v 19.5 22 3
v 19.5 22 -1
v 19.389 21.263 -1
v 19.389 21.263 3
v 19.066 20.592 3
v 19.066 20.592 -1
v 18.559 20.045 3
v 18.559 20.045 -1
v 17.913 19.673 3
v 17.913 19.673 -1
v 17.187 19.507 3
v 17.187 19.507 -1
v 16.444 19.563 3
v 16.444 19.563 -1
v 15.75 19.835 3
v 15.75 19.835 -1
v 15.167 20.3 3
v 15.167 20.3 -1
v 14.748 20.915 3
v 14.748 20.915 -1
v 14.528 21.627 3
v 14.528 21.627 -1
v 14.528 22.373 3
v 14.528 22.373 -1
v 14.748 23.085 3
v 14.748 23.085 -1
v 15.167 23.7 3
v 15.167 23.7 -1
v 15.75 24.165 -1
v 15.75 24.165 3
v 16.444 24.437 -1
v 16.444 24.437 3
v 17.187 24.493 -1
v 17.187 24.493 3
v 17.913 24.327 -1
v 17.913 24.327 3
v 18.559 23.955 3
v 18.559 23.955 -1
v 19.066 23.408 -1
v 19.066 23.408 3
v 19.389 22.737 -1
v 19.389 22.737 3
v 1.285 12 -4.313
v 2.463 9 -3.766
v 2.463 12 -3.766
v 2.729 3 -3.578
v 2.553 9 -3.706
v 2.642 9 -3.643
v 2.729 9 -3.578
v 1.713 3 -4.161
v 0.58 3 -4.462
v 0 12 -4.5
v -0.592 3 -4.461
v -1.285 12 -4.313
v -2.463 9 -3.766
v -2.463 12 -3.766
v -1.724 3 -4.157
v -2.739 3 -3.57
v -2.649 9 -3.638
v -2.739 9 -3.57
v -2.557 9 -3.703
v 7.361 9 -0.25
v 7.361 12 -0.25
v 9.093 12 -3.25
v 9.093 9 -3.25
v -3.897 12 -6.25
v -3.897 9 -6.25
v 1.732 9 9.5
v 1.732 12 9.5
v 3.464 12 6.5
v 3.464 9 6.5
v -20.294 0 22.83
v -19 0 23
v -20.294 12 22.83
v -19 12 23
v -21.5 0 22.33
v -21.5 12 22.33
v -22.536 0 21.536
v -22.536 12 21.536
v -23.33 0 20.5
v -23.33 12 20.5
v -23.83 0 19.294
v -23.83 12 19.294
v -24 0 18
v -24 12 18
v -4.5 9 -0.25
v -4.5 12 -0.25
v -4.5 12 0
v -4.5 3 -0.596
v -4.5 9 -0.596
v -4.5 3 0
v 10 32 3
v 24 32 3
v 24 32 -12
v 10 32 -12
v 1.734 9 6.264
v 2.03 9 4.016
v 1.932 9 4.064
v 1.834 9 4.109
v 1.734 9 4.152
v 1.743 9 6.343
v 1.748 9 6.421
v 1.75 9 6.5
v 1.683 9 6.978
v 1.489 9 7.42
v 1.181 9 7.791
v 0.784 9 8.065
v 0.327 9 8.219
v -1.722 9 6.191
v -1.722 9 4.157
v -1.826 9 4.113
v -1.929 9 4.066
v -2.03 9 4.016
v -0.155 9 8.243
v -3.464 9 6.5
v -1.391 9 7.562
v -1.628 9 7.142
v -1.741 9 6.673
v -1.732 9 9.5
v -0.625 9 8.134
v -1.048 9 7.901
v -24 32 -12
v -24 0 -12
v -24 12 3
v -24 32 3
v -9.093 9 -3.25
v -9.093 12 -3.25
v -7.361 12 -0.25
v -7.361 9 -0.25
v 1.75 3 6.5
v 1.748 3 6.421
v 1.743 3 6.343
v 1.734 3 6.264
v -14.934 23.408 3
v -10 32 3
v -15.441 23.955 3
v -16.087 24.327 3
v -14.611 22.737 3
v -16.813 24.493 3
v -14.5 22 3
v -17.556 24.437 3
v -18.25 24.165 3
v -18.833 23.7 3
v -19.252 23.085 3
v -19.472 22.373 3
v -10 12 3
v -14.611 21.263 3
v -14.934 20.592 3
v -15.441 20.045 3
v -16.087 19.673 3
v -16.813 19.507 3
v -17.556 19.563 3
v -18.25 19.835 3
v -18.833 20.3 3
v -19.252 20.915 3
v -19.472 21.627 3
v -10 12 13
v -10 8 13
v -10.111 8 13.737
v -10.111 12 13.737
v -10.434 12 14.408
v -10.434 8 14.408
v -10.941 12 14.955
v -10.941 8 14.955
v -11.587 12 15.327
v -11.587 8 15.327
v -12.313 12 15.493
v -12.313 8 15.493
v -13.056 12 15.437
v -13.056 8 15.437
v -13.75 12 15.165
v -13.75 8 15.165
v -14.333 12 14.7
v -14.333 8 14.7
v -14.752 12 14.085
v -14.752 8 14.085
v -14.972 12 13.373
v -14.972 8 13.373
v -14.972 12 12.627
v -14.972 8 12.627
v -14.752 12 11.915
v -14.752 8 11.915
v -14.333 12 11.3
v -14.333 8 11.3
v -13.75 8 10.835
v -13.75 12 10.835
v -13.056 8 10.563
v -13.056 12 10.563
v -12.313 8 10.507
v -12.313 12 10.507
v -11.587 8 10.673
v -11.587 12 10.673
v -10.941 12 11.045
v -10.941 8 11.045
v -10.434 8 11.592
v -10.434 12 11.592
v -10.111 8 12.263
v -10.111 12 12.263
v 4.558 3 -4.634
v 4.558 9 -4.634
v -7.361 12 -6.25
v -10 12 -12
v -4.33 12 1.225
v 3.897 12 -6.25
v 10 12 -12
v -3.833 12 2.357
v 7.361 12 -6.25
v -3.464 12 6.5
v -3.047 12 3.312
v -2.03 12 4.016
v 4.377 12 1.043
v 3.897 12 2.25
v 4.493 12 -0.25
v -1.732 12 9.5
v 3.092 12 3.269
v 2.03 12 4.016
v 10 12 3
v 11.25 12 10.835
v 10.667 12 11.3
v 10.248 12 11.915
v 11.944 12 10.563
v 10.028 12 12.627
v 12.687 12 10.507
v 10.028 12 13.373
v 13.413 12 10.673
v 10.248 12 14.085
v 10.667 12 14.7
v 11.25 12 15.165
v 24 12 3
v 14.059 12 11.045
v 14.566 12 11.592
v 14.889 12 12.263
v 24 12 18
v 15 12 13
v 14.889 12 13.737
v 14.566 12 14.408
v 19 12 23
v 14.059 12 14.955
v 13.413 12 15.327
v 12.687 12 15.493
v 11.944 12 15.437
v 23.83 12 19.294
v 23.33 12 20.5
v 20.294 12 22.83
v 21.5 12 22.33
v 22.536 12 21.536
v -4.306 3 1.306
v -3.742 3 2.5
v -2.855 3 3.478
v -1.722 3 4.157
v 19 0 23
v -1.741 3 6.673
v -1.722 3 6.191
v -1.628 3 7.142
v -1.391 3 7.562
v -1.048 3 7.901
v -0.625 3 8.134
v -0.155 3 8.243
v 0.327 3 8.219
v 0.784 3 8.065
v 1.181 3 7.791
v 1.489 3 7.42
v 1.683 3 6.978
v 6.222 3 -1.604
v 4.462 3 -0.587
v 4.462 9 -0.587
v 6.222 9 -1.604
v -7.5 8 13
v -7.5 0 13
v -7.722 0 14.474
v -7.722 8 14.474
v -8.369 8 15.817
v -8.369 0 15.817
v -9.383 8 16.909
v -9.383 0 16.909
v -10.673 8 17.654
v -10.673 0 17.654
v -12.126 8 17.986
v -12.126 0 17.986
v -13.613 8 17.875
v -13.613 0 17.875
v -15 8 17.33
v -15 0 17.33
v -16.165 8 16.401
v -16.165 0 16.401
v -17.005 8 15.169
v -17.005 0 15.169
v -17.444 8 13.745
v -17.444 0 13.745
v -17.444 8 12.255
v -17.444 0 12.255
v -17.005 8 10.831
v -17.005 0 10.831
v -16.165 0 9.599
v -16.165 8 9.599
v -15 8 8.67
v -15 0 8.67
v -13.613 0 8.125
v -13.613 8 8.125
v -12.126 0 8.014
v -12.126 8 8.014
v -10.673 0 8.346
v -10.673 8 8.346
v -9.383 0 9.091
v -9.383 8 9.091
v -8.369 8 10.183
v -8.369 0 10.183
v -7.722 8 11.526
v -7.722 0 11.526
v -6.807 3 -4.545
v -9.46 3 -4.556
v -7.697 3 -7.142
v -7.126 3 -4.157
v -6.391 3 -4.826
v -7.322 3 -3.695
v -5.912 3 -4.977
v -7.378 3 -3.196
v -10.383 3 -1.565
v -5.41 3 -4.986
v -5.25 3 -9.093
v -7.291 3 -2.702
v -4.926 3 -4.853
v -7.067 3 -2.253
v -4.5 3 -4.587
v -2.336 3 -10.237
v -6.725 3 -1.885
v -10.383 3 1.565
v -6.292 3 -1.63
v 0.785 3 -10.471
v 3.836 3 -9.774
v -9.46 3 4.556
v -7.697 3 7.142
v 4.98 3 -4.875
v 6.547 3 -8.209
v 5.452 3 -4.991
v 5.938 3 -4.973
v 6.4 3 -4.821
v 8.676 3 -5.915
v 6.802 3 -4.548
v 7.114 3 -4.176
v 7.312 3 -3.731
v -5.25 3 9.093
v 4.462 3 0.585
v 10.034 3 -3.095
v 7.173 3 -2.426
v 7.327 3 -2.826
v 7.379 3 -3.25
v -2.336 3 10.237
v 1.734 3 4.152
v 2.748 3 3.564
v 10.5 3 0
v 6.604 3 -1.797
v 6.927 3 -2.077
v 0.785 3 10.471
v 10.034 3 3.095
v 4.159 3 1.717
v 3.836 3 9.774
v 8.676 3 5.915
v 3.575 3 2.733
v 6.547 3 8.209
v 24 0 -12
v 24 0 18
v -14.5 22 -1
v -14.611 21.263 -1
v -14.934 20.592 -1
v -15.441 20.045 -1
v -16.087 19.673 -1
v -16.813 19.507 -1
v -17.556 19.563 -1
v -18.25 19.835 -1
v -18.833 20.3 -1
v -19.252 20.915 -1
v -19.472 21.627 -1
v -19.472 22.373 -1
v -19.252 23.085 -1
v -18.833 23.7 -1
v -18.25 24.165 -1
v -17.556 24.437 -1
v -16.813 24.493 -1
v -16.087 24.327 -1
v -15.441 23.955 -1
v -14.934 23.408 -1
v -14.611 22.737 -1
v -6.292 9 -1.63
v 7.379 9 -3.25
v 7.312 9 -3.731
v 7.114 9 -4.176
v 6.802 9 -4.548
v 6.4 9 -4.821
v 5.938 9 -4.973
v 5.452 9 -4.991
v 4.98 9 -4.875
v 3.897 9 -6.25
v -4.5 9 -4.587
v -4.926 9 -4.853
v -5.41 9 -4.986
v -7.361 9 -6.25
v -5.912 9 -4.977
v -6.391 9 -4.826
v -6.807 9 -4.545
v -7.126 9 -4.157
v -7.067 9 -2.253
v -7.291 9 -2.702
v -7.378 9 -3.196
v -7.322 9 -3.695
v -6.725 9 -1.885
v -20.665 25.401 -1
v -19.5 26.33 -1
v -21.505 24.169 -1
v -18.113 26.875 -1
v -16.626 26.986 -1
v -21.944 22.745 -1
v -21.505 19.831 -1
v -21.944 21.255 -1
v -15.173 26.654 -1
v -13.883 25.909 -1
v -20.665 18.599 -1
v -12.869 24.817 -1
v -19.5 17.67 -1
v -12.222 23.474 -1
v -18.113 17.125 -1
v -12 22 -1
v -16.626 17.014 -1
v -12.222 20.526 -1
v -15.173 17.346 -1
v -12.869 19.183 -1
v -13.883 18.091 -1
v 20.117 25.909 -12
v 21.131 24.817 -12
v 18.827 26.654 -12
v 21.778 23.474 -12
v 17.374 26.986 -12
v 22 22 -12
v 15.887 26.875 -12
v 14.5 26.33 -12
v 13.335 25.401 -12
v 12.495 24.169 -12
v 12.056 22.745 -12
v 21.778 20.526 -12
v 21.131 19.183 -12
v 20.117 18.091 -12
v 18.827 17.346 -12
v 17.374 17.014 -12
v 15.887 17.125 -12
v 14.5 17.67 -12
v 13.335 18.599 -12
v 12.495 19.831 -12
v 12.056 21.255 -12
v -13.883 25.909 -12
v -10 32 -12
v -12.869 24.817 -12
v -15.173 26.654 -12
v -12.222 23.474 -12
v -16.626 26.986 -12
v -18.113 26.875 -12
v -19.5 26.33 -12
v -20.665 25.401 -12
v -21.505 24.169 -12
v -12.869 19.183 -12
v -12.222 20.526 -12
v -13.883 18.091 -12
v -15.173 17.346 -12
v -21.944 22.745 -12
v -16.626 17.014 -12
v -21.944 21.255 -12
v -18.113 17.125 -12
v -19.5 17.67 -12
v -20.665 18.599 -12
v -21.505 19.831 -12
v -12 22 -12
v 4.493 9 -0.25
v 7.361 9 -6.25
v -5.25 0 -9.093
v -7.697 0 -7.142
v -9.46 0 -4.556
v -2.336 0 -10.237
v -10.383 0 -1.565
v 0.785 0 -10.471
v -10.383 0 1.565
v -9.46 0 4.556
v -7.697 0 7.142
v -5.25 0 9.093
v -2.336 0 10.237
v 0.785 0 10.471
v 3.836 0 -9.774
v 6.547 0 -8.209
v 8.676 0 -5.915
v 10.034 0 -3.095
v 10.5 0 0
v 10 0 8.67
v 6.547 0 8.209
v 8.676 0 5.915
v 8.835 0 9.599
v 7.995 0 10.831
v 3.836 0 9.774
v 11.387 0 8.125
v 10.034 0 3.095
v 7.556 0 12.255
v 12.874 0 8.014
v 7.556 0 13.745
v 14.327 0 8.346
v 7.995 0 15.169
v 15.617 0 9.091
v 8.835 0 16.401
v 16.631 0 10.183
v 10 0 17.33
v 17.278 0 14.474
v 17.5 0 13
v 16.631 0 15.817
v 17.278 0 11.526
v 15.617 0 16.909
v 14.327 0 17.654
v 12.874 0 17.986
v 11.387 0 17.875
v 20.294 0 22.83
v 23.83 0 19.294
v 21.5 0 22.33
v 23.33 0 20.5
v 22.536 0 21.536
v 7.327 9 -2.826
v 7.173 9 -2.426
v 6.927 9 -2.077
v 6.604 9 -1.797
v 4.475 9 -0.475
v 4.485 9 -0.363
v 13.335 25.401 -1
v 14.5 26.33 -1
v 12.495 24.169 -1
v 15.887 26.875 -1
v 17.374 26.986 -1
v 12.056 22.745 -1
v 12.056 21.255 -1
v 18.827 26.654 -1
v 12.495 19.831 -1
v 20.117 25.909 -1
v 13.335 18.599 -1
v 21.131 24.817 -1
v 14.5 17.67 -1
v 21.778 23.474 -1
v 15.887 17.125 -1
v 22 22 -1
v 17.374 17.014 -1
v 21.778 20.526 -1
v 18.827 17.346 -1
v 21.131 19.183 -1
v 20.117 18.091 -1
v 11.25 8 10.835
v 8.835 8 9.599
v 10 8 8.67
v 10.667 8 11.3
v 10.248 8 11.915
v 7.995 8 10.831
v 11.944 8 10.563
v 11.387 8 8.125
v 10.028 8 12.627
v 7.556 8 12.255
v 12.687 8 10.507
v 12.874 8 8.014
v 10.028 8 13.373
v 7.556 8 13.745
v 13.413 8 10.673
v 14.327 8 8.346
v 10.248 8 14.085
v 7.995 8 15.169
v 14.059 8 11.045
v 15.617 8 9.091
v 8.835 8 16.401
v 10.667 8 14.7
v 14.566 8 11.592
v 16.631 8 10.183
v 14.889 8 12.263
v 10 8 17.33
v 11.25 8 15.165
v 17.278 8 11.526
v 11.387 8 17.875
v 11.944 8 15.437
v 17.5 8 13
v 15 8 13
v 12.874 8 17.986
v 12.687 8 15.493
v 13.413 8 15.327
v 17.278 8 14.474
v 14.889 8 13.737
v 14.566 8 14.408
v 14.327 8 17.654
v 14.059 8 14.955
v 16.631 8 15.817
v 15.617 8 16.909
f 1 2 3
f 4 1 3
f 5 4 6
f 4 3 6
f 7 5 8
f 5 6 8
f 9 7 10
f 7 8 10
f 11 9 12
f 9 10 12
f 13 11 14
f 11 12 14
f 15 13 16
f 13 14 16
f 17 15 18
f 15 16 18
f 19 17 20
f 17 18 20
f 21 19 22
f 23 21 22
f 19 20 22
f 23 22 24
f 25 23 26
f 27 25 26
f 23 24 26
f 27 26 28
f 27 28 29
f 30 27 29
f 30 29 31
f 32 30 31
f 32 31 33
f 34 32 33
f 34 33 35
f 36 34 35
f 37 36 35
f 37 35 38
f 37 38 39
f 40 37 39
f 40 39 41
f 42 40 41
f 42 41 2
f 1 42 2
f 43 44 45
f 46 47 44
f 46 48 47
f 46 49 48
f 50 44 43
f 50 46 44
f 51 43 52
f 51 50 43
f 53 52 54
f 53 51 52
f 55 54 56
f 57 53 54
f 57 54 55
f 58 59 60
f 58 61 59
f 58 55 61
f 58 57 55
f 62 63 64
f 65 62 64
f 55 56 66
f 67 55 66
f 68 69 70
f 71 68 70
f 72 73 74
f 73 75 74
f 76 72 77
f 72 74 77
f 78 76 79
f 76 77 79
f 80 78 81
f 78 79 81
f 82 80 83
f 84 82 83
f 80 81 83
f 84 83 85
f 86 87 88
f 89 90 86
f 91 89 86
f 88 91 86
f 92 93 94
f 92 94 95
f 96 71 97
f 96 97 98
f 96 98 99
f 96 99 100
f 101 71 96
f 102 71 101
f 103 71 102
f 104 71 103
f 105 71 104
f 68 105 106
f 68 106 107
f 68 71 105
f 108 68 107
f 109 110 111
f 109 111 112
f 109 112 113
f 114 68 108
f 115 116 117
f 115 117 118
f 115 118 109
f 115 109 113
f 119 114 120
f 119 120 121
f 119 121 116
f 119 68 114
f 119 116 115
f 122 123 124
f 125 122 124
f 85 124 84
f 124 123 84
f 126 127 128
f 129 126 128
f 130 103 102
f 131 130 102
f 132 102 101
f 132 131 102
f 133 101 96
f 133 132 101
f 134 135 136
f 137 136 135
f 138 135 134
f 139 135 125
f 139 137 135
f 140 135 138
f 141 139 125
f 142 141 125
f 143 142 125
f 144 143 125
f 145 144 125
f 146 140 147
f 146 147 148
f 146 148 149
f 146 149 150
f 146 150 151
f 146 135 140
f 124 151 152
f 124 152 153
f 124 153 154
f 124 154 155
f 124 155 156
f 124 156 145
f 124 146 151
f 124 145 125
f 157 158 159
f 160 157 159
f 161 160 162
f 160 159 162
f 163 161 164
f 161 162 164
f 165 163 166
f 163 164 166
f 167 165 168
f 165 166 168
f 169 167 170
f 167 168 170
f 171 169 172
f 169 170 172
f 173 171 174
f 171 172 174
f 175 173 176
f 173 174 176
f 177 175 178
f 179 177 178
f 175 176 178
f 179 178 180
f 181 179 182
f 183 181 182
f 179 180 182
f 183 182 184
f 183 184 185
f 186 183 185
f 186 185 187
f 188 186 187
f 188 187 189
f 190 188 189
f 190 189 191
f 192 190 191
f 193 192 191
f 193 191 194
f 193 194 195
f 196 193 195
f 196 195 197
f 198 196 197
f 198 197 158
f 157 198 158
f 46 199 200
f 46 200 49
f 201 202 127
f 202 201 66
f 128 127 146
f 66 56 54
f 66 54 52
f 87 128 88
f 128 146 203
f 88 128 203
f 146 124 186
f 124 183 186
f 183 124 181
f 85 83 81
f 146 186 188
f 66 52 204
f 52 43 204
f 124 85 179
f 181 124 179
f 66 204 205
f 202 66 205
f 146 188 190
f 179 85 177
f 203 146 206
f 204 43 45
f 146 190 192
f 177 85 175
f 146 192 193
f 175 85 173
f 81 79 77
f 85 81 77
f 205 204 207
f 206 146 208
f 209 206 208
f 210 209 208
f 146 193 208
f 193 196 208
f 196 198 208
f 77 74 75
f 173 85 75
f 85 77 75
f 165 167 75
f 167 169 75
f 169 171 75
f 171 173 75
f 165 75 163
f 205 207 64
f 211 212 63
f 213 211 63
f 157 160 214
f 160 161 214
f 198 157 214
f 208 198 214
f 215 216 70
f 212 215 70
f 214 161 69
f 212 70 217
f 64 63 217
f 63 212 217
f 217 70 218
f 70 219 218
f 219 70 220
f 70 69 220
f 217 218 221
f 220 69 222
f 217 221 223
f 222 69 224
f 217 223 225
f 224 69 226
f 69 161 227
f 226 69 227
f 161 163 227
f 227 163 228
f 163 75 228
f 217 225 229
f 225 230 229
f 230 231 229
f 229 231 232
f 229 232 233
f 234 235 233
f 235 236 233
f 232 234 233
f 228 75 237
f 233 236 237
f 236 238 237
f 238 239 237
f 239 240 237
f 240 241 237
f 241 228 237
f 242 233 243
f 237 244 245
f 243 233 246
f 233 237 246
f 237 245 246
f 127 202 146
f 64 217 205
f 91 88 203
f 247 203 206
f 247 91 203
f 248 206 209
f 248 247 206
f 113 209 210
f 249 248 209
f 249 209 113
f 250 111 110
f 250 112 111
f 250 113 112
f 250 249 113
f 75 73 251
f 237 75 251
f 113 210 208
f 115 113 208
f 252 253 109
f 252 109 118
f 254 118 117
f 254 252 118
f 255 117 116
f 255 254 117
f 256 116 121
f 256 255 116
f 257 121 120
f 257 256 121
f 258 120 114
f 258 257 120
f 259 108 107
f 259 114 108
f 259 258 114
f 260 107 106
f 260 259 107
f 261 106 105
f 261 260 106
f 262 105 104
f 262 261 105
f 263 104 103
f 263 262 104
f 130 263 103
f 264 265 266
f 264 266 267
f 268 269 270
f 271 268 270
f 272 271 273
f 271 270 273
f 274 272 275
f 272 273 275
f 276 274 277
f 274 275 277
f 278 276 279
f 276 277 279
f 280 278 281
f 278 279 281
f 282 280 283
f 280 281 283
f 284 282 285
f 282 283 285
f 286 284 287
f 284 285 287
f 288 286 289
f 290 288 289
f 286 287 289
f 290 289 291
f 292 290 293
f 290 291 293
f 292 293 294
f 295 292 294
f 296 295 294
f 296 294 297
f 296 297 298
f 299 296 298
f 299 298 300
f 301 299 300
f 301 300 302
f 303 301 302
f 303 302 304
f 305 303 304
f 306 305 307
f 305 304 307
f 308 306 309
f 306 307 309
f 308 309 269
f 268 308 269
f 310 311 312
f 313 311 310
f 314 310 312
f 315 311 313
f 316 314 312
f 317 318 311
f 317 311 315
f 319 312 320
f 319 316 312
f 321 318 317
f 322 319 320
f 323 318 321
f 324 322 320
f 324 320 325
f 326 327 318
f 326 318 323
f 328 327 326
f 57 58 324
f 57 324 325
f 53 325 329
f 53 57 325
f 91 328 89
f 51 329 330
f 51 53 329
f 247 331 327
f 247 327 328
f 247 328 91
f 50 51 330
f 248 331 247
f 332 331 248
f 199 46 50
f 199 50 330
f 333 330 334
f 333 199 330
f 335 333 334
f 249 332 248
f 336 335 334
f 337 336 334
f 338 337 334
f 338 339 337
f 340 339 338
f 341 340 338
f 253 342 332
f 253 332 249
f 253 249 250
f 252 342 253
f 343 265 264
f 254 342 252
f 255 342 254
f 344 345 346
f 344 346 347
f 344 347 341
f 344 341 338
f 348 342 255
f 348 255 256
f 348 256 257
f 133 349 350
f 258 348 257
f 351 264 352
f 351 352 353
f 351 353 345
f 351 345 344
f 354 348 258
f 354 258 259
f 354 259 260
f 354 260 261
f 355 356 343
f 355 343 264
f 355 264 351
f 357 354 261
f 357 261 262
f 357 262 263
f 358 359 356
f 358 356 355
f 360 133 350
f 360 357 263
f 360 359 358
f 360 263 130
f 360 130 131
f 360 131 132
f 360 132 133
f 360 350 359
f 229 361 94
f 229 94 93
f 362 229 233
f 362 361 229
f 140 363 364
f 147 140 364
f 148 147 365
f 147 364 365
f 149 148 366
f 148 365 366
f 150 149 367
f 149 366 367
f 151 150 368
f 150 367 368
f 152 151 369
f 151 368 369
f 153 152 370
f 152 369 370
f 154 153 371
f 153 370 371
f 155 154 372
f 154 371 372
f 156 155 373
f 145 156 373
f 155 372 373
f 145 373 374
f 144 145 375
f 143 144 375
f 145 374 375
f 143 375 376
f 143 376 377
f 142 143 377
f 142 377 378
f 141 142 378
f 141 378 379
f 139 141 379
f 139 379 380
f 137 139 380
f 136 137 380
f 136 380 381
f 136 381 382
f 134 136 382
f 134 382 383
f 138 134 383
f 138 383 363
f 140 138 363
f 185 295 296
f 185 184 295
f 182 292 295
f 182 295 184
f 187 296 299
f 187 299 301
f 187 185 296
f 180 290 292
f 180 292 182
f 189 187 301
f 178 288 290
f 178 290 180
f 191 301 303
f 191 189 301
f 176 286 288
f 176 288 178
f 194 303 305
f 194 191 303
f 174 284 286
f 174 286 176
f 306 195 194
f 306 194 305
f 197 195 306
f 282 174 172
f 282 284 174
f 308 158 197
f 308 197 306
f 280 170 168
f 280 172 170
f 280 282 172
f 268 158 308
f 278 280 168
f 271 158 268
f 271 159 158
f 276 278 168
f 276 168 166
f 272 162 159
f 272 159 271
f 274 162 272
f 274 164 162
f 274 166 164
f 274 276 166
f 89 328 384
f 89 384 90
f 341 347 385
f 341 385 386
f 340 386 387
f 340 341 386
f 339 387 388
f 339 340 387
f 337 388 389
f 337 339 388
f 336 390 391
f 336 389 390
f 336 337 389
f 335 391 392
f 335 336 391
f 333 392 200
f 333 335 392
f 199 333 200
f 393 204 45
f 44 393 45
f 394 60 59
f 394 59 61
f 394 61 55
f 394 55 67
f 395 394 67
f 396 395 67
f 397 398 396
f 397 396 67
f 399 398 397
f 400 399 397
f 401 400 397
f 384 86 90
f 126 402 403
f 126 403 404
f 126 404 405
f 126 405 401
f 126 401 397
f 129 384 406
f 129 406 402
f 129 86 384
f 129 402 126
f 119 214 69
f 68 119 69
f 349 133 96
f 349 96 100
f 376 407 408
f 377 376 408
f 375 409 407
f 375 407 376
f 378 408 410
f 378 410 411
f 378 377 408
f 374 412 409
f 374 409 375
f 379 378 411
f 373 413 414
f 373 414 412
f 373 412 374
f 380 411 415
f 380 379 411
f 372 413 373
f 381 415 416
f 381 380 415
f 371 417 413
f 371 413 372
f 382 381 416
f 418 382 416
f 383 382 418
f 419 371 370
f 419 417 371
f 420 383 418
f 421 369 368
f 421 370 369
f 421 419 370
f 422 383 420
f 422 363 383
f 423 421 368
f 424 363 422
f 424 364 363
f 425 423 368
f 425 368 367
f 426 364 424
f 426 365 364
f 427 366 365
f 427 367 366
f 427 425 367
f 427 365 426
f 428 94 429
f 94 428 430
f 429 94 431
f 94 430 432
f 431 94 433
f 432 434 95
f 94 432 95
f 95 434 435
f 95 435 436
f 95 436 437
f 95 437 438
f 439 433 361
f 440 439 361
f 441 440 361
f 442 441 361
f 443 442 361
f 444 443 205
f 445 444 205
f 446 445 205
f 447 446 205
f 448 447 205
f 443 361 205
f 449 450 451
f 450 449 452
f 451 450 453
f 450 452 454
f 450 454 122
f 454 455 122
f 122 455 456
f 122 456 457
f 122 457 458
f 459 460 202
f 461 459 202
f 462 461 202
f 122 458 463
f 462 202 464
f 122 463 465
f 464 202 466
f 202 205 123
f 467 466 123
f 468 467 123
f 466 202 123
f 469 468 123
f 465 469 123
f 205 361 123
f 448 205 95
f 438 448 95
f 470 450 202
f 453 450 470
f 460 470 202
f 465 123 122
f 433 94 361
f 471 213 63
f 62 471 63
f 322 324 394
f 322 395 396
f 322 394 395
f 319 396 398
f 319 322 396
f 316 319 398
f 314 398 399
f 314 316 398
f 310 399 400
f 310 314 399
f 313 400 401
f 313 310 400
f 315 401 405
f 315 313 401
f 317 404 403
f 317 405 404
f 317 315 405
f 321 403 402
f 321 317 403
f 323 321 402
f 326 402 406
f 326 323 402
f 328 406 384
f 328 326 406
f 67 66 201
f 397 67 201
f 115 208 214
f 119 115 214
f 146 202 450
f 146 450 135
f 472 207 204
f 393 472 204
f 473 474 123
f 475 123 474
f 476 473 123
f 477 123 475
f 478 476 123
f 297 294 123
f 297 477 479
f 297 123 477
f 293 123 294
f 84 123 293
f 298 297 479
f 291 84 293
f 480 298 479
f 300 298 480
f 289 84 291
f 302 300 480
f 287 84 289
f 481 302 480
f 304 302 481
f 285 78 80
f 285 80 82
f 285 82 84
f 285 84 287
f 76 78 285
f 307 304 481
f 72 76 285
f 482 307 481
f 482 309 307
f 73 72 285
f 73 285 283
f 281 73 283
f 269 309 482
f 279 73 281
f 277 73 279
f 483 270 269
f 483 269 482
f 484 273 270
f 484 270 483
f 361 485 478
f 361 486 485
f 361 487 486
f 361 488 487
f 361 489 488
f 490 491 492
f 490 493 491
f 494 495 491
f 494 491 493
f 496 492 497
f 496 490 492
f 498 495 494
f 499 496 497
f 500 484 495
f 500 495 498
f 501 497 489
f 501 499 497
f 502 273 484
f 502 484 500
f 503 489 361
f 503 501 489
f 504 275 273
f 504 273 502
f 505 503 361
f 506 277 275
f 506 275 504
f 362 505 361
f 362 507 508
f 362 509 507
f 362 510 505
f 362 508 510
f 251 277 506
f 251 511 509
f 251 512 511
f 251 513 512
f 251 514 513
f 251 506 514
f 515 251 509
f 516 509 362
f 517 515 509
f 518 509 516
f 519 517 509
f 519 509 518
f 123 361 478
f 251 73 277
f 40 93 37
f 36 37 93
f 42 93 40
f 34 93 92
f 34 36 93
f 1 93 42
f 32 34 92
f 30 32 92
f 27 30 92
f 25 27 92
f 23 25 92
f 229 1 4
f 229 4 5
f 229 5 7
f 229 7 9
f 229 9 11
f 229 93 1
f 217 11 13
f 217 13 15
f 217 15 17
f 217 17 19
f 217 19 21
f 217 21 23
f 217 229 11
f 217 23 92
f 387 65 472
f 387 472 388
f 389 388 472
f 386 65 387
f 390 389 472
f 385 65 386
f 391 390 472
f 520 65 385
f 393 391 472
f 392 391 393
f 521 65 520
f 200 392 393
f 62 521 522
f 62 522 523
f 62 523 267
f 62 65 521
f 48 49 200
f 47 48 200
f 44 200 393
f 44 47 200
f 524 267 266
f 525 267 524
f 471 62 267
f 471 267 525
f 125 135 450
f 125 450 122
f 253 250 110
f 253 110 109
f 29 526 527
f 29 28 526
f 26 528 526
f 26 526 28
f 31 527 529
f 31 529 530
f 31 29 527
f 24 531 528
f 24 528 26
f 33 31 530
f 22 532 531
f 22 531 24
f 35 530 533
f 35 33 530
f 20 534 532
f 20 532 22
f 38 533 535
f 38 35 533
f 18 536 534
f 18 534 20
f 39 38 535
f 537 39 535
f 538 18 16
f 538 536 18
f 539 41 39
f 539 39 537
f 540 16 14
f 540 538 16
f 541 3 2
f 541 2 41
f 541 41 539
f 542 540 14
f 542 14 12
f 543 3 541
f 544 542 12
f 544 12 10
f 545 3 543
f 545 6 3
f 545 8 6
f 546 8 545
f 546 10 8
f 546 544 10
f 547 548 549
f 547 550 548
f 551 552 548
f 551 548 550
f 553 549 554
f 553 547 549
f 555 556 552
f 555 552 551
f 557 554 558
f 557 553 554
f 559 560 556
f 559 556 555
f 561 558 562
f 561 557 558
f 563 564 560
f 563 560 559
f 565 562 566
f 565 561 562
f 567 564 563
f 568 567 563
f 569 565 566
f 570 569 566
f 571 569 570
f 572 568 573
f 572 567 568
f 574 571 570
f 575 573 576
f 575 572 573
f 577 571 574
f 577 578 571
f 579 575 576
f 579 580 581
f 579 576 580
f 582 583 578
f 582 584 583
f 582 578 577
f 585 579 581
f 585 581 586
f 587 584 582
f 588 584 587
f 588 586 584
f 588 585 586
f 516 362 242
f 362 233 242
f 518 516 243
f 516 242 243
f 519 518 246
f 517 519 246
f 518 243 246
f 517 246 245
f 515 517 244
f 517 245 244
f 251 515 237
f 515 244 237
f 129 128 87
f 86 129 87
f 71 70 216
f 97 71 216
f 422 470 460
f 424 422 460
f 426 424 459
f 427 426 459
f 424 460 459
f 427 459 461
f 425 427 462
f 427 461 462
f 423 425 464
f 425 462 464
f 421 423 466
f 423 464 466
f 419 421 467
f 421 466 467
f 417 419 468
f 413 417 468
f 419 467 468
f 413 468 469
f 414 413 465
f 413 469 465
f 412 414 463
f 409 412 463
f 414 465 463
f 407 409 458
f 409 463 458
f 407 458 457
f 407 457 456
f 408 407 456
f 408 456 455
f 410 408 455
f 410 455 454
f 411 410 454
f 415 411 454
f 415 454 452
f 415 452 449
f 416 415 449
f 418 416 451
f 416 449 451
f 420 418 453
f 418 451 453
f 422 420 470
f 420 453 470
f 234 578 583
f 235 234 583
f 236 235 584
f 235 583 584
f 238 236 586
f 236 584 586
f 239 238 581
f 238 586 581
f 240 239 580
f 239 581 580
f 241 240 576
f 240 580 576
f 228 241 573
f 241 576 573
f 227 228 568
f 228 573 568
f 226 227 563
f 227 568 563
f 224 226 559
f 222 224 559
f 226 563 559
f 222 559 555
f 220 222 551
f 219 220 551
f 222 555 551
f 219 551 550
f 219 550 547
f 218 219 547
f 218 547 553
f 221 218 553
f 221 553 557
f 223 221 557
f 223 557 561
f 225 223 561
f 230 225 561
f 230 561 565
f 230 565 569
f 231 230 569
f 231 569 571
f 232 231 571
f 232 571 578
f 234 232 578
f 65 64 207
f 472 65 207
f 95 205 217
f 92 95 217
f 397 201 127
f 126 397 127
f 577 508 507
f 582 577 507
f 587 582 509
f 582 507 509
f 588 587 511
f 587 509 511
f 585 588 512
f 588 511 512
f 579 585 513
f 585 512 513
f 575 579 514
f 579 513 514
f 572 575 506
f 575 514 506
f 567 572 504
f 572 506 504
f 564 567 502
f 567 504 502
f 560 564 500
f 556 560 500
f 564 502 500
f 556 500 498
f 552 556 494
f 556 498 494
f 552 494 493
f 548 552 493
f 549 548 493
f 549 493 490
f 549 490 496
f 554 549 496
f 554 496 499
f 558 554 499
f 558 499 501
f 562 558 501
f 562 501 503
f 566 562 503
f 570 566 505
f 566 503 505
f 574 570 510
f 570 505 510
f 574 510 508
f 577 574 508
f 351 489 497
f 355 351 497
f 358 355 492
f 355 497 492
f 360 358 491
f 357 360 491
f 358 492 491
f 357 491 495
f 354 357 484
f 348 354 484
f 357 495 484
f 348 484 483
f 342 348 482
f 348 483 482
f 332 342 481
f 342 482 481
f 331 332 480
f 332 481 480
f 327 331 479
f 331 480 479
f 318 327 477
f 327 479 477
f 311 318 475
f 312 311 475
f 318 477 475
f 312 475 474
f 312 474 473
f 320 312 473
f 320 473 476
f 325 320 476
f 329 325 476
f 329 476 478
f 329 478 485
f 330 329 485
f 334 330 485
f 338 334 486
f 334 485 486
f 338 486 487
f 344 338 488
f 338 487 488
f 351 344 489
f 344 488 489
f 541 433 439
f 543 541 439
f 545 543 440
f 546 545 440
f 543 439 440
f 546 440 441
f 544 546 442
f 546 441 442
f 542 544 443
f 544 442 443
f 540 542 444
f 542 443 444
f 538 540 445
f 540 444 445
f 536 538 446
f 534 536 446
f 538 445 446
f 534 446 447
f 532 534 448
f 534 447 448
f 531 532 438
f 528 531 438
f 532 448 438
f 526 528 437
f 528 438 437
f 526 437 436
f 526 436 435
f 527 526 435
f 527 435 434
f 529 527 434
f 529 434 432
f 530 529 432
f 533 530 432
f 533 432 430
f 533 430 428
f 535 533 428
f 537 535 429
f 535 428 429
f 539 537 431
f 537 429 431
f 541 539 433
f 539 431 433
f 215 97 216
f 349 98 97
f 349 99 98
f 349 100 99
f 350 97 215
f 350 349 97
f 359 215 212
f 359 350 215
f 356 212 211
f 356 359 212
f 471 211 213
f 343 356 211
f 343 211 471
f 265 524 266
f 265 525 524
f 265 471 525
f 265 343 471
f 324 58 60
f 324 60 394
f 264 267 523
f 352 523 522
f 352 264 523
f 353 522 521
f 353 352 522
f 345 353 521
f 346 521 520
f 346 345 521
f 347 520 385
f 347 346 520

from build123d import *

# Parameters (mm, degrees)
F0_W      = 48
F0_H      = 35
F0_R      = 10.5
F0_R_2    = 5
F0_R_3    = 2.5
F1_DEPTH  = 12
F2_DEPTH  = 8
F3_DEPTH  = 3
F5_DEPTH  = 3
F4_W      = 14
F4_H      = 15
F6_DEPTH  = 20
F7_R      = 2.5
F8_DEPTH  = 35.001
F9_R      = 5
F7_R_2    = 5
F10_DEPTH = 11


with BuildPart() as f1:
    # F0 (on Front) → F1 (new body)
    with BuildSketch(Plane.XZ):
        with Locations((0, 5.5)):
            Rectangle(F0_W, F0_H)
        Circle(F0_R, mode=Mode.SUBTRACT)
        with Locations((-12.5, 13)):
            Circle(F0_R_2, mode=Mode.SUBTRACT)
        with Locations((12.5, 13)):
            Circle(F0_R_2, mode=Mode.SUBTRACT)
        with Locations((-12.5, 13)):
            Circle(F0_R_2)
        with Locations((-12.5, 13)):
            Circle(F0_R_3, mode=Mode.SUBTRACT)
        with Locations((12.5, 13)):
            Circle(F0_R_2)
        with Locations((12.5, 13)):
            Circle(F0_R_3, mode=Mode.SUBTRACT)
        Circle(F0_R)
        with BuildLine():
            ThreePointArc((2.729107717, -3.5779842186), (-0.0063032395, -4.4999955855), (-2.7391205053, -3.5703247551))
            Line((-2.7391205053, -3.5703247551), (-4.5, -4.5869690054))
            ThreePointArc((-4.5, -4.5869690054), (-7.1256799724, -4.1571622293), (-6.2921852092, -1.6304616808))
            Line((-6.2921852092, -1.6304616808), (-4.5, -0.5957430678))
            Line((-4.5, -0.5957430678), (-4.5, 0))
            ThreePointArc((-4.5, 0), (-3.7417203652, 2.49990574), (-1.722431685, 4.1573103192))
            Line((-1.722431685, 4.1573103192), (-1.722431685, 6.1905988197))
            ThreePointArc((-1.722431685, 6.1905988197), (-0.1553134752, 8.2430942959), (1.75, 6.5))
            ThreePointArc((1.75, 6.5), (1.7460133012, 6.3819425903), (1.7340713692, 6.2644230769))
            Line((1.7340713692, 6.2644230769), (1.7340713692, 4.1524687219))
            ThreePointArc((1.7340713692, 4.1524687219), (3.9002621137, 2.2445390272), (4.4615521904, -0.5869855641))
            Line((4.4615521904, -0.5869855641), (6.222431685, -1.6036298143))
            ThreePointArc((6.222431685, -1.6036298143), (7.0610723284, -2.243947437), (7.3791651246, -3.25))
            ThreePointArc((7.3791651246, -3.25), (6.3999310593, -4.8211205791), (4.5581138401, -4.6339613961))
            Line((4.5581138401, -4.6339613961), (2.729107717, -3.5779842186))
        make_face(mode=Mode.SUBTRACT)
    extrude(amount=-F1_DEPTH)

    # F0 (on Front) → F2 (cut)
    with BuildSketch(Plane.XZ):
        with Locations((12.5, 13)):
            Circle(F0_R_2)
        with Locations((12.5, 13)):
            Circle(F0_R_3, mode=Mode.SUBTRACT)
        with Locations((-12.5, 13)):
            Circle(F0_R_2)
        with Locations((-12.5, 13)):
            Circle(F0_R_3, mode=Mode.SUBTRACT)
    extrude(amount=-F2_DEPTH, mode=Mode.SUBTRACT)

    # F0 (on Front) → F3 (cut)
    with BuildSketch(Plane.XZ):
        Circle(F0_R)
        with BuildLine():
            ThreePointArc((2.729107717, -3.5779842186), (-0.0063032395, -4.4999955855), (-2.7391205053, -3.5703247551))
            Line((-2.7391205053, -3.5703247551), (-4.5, -4.5869690054))
            ThreePointArc((-4.5, -4.5869690054), (-7.1256799724, -4.1571622293), (-6.2921852092, -1.6304616808))
            Line((-6.2921852092, -1.6304616808), (-4.5, -0.5957430678))
            Line((-4.5, -0.5957430678), (-4.5, 0))
            ThreePointArc((-4.5, 0), (-3.7417203652, 2.49990574), (-1.722431685, 4.1573103192))
            Line((-1.722431685, 4.1573103192), (-1.722431685, 6.1905988197))
            ThreePointArc((-1.722431685, 6.1905988197), (-0.1553134752, 8.2430942959), (1.75, 6.5))
            ThreePointArc((1.75, 6.5), (1.7460133012, 6.3819425903), (1.7340713692, 6.2644230769))
            Line((1.7340713692, 6.2644230769), (1.7340713692, 4.1524687219))
            ThreePointArc((1.7340713692, 4.1524687219), (3.9002621137, 2.2445390272), (4.4615521904, -0.5869855641))
            Line((4.4615521904, -0.5869855641), (6.222431685, -1.6036298143))
            ThreePointArc((6.222431685, -1.6036298143), (7.0610723284, -2.243947437), (7.3791651246, -3.25))
            ThreePointArc((7.3791651246, -3.25), (6.3999310593, -4.8211205791), (4.5581138401, -4.6339613961))
            Line((4.5581138401, -4.6339613961), (2.729107717, -3.5779842186))
        make_face(mode=Mode.SUBTRACT)
    extrude(amount=-F3_DEPTH, mode=Mode.SUBTRACT)

    # F4 (on face) → F5 (cut)
    with BuildSketch(Plane(origin=(0, 12, 0), x_dir=(-1, 0, 0), z_dir=(0, 1, 0))):
        with BuildLine():
            ThreePointArc((-4.4615521904, -0.5869855641), (-4.4804704843, -0.4187890156), (-4.4930501889, -0.25))
            Line((-4.4930501889, -0.25), (-7.3612159322, -0.25))
            Line((-7.3612159322, -0.25), (-9.0932667397, -3.25))
            Line((-9.0932667397, -3.25), (-7.3612159322, -6.25))
            Line((-7.3612159322, -6.25), (-3.897114317, -6.25))
            Line((-3.897114317, -6.25), (-2.4630314454, -3.7660956041))
            ThreePointArc((-2.4630314454, -3.7660956041), (-2.597772843, -3.6744491092), (-2.729107717, -3.5779842186))
            Line((-2.729107717, -3.5779842186), (-4.5581138401, -4.6339613961))
            ThreePointArc((-4.5581138401, -4.6339613961), (-7.1630480845, -4.0924387607), (-6.222431685, -1.6036298143))
            Line((-6.222431685, -1.6036298143), (-4.4615521904, -0.5869855641))
        make_face()
        with BuildLine():
            Line((1.7320508076, 9.5), (-1.7320508076, 9.5))
            Line((-1.7320508076, 9.5), (-3.4641016151, 6.5))
            Line((-3.4641016151, 6.5), (-2.0300187435, 4.0160956041))
            ThreePointArc((-2.0300187435, 4.0160956041), (-1.883279852, 4.0869618299), (-1.7340713692, 4.1524687219))
            Line((-1.7340713692, 4.1524687219), (-1.7340713692, 6.2644230769))
            ThreePointArc((-1.7340713692, 6.2644230769), (0.0373681121, 8.24960099), (1.722431685, 6.1905988197))
            Line((1.722431685, 6.1905988197), (1.722431685, 4.1573103192))
            ThreePointArc((1.722431685, 4.1573103192), (1.8775533158, 4.0895957681), (2.0300187435, 4.0160956041))
            Line((2.0300187435, 4.0160956041), (3.4641016151, 6.5))
            Line((3.4641016151, 6.5), (1.7320508076, 9.5))
        make_face()
        with BuildLine():
            Line((7.3612159322, -0.25), (4.5, -0.25))
            Line((4.5, -0.25), (4.5, -0.5957430678))
            Line((4.5, -0.5957430678), (6.2921852092, -1.6304616808))
            ThreePointArc((6.2921852092, -1.6304616808), (7.1256799724, -4.1571622293), (4.5, -4.5869690054))
            Line((4.5, -4.5869690054), (2.7391205053, -3.5703247551))
            ThreePointArc((2.7391205053, -3.5703247551), (2.6029171685, -3.6708067525), (2.4630314454, -3.7660956041))
            Line((2.4630314454, -3.7660956041), (3.897114317, -6.25))
            Line((3.897114317, -6.25), (7.3612159322, -6.25))
            Line((7.3612159322, -6.25), (9.0932667397, -3.25))
            Line((9.0932667397, -3.25), (7.3612159322, -0.25))
        make_face()
    extrude(amount=-F5_DEPTH, mode=Mode.SUBTRACT)

    # F4 (on face) → F6 (join)
    with BuildSketch(Plane(origin=(0, 12, 0), x_dir=(-1, 0, 0), z_dir=(0, 1, 0))):
        with Locations((-17, -4.5)):
            Rectangle(F4_W, F4_H)
        with Locations((17, -4.5)):
            Rectangle(F4_W, F4_H)
    extrude(amount=F6_DEPTH)

    # F7 (on face) → F8 (cut, through all)
    with BuildSketch(Plane(origin=(0, 0, -12), x_dir=(1, 0, 0), z_dir=(0, 0, -1))):
        with Locations((-17, -22)):
            Circle(F7_R)
        with Locations((17, -22)):
            Circle(F7_R)
    extrude(amount=-F8_DEPTH, mode=Mode.SUBTRACT)

    # F9
    f9_edges = [f1.edges().sort_by_distance(p)[0] for p in [
        (-24, 6, 23),
        (24, 6, 23),
    ]]
    fillet(f9_edges, radius=F9_R)

    # F7 (on face) → F10 (cut)
    with BuildSketch(Plane(origin=(0, 0, -12), x_dir=(1, 0, 0), z_dir=(0, 0, -1))):
        with Locations((-17, -22)):
            Circle(F7_R_2)
        with Locations((-17, -22)):
            Circle(F7_R, mode=Mode.SUBTRACT)
        with Locations((17, -22)):
            Circle(F7_R_2)
        with Locations((17, -22)):
            Circle(F7_R, mode=Mode.SUBTRACT)
    extrude(amount=-F10_DEPTH, mode=Mode.SUBTRACT)


solid = f1.part
